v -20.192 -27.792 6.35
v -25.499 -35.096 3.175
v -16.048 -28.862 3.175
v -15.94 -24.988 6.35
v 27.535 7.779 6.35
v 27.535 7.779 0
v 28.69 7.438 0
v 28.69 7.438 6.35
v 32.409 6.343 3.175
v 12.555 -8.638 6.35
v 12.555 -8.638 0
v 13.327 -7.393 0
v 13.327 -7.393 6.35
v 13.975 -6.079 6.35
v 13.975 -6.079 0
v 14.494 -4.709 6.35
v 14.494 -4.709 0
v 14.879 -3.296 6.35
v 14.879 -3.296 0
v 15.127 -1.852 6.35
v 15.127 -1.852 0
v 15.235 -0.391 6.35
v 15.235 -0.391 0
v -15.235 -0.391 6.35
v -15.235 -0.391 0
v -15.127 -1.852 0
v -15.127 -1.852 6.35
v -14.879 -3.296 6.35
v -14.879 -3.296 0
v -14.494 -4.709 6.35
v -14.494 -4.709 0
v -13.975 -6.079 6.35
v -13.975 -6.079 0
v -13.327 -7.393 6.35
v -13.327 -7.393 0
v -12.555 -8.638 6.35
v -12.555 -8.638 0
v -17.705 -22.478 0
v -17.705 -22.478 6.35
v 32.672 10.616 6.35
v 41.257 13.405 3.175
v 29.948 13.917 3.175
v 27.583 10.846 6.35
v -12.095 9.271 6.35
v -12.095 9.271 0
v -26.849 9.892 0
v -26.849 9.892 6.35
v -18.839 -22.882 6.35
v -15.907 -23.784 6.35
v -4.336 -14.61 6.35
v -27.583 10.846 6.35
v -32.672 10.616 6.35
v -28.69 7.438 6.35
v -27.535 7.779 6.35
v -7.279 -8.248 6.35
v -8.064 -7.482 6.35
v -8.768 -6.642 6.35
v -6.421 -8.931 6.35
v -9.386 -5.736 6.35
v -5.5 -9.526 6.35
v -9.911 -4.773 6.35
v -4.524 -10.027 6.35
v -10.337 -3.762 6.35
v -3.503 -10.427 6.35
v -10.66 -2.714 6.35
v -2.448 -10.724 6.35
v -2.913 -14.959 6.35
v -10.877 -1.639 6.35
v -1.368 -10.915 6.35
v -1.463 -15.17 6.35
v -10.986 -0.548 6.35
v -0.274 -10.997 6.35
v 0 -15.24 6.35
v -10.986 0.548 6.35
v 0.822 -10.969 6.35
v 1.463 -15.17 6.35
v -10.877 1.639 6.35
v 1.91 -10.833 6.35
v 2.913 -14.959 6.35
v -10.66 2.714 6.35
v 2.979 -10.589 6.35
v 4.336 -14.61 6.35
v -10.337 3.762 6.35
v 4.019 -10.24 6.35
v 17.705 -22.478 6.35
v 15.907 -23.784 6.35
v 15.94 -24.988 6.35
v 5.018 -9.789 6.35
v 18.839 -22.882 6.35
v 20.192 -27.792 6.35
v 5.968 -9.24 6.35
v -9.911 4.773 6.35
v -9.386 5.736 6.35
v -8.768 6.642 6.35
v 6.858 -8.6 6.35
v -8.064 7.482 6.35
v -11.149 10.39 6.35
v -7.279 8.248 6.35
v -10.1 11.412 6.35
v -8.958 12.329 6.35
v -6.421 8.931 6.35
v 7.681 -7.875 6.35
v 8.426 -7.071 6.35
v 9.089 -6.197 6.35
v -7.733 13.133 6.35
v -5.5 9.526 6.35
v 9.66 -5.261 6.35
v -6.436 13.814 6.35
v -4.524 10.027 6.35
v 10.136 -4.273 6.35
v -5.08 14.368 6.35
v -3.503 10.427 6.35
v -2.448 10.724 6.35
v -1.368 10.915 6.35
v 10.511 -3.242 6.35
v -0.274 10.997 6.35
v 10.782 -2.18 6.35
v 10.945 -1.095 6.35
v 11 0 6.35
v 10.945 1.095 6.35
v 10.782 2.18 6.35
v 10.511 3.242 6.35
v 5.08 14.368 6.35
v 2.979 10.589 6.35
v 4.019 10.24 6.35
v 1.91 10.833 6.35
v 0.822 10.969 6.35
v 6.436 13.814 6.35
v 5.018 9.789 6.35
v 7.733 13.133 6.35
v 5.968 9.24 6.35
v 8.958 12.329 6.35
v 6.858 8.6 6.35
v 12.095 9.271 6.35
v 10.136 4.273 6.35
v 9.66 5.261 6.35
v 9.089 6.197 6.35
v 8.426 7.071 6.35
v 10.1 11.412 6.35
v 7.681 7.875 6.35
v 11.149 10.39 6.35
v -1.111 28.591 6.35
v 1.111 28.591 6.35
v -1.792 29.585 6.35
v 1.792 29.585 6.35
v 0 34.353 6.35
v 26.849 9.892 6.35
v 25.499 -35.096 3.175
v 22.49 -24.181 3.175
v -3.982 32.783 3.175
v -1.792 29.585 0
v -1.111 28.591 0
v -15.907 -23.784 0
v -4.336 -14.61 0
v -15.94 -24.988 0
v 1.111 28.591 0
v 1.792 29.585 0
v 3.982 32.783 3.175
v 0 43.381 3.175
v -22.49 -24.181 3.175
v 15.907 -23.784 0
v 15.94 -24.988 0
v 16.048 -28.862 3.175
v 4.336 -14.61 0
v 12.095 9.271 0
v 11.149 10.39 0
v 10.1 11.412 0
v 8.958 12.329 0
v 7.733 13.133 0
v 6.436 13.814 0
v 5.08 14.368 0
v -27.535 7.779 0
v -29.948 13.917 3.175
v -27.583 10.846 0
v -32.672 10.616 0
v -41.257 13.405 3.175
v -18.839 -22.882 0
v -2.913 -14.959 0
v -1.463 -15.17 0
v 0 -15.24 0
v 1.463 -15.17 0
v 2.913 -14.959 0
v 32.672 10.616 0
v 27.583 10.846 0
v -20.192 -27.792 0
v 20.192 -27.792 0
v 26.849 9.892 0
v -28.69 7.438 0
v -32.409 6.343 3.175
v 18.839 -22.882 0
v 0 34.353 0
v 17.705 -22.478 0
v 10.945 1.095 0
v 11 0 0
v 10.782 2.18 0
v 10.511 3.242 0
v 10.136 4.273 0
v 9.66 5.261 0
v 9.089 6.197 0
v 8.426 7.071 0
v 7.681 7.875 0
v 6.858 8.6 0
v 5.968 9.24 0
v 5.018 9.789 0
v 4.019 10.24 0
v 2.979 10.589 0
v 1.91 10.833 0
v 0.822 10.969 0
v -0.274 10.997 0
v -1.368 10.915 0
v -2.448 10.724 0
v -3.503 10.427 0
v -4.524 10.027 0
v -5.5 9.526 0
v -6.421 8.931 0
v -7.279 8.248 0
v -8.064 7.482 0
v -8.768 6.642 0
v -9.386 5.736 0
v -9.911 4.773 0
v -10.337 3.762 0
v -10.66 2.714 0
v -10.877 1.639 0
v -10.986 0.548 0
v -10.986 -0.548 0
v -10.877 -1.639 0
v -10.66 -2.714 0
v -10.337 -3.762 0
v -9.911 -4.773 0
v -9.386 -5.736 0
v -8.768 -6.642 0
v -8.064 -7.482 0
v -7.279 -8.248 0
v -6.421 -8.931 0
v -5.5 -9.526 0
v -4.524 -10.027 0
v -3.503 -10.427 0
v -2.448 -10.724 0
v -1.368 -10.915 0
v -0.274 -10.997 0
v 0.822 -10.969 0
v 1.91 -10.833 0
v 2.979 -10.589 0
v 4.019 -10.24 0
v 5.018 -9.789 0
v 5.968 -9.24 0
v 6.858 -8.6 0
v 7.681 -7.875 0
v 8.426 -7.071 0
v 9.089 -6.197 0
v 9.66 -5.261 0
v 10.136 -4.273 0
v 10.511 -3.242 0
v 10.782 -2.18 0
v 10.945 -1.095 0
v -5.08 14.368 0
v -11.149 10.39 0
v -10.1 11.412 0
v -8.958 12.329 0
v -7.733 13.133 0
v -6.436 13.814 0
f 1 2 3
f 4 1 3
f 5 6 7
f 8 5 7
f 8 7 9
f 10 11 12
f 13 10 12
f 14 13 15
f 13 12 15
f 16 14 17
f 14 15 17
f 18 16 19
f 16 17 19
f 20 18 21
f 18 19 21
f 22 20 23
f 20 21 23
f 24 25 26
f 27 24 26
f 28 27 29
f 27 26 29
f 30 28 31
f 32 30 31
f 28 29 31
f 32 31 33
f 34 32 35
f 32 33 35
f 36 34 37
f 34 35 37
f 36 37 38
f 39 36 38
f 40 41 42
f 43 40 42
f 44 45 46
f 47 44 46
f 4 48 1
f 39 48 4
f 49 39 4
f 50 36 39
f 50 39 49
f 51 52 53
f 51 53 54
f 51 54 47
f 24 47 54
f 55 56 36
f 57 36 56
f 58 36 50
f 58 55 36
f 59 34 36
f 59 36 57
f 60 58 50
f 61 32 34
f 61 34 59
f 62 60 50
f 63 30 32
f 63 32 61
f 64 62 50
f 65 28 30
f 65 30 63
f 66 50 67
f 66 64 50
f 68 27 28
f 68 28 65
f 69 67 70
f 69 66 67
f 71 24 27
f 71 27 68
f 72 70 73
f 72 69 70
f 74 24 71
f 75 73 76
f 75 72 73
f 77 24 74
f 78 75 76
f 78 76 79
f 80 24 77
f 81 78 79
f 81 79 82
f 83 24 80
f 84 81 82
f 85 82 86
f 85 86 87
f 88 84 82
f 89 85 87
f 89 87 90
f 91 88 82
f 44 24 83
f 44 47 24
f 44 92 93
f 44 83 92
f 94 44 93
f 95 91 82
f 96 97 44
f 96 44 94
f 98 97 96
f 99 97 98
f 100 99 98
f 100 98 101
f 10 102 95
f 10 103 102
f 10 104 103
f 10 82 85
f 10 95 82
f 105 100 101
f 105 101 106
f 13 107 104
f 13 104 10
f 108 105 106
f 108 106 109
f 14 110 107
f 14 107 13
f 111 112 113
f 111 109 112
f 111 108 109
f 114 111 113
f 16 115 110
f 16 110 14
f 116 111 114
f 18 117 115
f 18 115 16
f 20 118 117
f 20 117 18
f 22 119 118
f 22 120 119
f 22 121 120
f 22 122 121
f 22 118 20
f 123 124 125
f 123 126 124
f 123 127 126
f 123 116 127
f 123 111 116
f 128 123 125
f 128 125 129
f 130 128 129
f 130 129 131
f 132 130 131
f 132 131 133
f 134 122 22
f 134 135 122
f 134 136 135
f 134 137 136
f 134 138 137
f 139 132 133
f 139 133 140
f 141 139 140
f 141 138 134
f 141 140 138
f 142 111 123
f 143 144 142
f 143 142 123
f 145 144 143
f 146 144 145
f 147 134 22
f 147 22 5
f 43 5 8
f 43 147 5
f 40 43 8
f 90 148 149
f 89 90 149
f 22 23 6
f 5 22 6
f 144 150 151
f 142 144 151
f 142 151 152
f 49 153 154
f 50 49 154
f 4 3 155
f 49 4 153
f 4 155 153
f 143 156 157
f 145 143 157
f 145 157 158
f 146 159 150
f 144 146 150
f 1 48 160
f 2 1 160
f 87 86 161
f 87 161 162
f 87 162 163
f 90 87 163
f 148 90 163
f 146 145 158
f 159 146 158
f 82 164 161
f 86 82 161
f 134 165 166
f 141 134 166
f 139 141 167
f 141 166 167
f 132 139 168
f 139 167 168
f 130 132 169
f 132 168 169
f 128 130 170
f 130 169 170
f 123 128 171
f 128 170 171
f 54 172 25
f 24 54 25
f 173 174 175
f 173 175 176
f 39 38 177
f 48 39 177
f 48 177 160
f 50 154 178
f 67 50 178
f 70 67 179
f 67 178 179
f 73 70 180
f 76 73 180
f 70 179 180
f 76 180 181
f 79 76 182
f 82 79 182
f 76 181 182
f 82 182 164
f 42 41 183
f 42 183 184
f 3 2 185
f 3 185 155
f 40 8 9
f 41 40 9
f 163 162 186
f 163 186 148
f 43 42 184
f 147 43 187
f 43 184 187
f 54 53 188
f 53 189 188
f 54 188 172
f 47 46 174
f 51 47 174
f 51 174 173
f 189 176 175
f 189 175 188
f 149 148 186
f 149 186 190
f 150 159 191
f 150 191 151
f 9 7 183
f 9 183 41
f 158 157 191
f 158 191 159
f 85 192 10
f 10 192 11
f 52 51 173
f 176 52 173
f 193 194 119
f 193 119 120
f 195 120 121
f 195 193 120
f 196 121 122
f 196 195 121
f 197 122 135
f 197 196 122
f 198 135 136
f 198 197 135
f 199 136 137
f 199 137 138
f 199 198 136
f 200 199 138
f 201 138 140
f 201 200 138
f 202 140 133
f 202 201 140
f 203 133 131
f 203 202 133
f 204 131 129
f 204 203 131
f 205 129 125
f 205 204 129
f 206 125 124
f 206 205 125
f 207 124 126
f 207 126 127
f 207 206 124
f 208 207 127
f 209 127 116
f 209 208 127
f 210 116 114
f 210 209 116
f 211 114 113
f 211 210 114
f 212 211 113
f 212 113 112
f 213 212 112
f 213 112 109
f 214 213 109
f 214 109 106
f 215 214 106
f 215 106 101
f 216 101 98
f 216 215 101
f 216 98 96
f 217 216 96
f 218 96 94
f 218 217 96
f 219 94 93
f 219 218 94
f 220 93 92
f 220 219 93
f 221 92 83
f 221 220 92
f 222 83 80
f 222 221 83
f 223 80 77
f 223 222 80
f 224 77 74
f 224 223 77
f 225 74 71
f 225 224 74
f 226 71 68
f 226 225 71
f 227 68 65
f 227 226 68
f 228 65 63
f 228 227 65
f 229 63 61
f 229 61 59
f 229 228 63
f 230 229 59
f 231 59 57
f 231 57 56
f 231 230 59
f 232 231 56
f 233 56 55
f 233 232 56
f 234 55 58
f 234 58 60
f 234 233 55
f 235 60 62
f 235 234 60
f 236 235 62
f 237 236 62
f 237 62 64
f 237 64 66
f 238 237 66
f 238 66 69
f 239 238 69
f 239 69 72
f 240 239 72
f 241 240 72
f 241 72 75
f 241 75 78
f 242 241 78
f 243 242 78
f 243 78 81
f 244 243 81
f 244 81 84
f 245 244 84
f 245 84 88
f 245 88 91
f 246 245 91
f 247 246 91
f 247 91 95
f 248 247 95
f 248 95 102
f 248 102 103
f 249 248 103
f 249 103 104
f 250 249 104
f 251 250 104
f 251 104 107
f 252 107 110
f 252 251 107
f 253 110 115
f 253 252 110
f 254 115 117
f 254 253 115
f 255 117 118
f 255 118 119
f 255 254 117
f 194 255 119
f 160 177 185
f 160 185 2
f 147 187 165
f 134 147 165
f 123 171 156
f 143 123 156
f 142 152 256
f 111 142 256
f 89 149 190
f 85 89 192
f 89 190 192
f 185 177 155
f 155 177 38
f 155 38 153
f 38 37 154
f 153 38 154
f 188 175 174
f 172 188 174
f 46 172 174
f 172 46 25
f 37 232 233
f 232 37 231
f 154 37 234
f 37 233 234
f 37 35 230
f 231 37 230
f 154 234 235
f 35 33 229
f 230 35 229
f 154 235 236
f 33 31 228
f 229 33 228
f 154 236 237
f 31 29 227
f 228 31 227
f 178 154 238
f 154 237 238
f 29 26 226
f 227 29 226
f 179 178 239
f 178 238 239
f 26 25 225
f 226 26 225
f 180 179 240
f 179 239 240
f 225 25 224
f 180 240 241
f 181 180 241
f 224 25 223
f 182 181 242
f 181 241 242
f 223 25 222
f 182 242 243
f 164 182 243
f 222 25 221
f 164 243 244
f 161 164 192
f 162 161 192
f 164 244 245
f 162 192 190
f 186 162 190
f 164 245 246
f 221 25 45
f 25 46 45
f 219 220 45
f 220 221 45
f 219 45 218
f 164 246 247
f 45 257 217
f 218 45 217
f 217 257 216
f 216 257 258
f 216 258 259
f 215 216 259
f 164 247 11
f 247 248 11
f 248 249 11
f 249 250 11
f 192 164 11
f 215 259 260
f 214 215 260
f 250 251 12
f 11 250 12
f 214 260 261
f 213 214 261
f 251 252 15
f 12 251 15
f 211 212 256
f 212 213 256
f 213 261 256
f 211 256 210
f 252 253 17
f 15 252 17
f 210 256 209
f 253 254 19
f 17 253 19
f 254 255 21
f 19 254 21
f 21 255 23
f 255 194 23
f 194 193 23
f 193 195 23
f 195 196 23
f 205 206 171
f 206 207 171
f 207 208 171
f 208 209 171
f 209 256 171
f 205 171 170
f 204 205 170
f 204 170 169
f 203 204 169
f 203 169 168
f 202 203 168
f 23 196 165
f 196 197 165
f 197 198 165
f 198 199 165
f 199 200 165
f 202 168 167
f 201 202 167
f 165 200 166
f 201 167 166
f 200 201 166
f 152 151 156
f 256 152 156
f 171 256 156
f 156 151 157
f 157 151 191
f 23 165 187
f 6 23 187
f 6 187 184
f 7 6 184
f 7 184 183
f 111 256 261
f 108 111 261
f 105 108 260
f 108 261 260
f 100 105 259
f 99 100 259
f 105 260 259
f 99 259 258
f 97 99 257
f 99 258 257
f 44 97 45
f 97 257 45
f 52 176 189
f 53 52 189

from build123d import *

# Parameters (mm, degrees)
F0_R     = 11.0000034
F1_DEPTH = 6.35
F2_SIZE  = 3.17499


# Not quite as in the source:
# - a fillet or chamfer is up to 0.001 mm smaller than in the source, because OpenCascade refuses the exact size


with BuildPart() as f1:
    # F0 (on Top) → F1 (new body)
    with BuildSketch(Plane.XY):
        with BuildLine():
            Line((-1.1111190304, 28.591448421), (-5.08, 14.3684097937))
            ThreePointArc((-5.08, 14.3684097937), (-8.9578472449, 12.3294189943), (-12.0953634317, 9.2714499112))
            Line((-12.0953634317, 9.2714499112), (-26.8487286679, 9.8919804501))
            Line((-26.8487286679, 9.8919804501), (-29.9476720311, 13.9172692636))
            Line((-29.9476720311, 13.9172692636), (-41.2574764774, 13.4053667244))
            Line((-41.2574764774, 13.4053667244), (-32.4085412404, 6.3434926108))
            Line((-32.4085412404, 6.3434926108), (-27.5354379943, 7.7785064617))
            Line((-27.5354379943, 7.7785064617), (-15.2349760945, -0.3912842944))
            ThreePointArc((-15.2349760945, -0.3912842944), (-14.4941013083, -4.7094189943), (-12.5553457071, -8.6383386236))
            Line((-12.5553457071, -8.6383386236), (-17.7045459019, -22.4778682868))
            Line((-17.7045459019, -22.4778682868), (-22.4904492218, -24.1812559153))
            Line((-22.4904492218, -24.1812559153), (-25.4985227531, -35.0957057161))
            Line((-25.4985227531, -35.0957057161), (-16.0478099898, -28.8621073099))
            Line((-16.0478099898, -28.8621073099), (-15.9067175452, -23.784067046))
            Line((-15.9067175452, -23.784067046), (-4.3357330442, -14.6102367869))
            ThreePointArc((-4.3357330442, -14.6102367869), (0, -15.24), (4.3357330442, -14.6102367869))
            Line((4.3357330442, -14.6102367869), (15.9067175452, -23.784067046))
            Line((15.9067175452, -23.784067046), (16.0478099898, -28.8621073099))
            Line((16.0478099898, -28.8621073099), (25.4985227531, -35.0957057161))
            Line((25.4985227531, -35.0957057161), (22.4904492218, -24.1812559153))
            Line((22.4904492218, -24.1812559153), (17.7045459019, -22.4778682868))
            Line((17.7045459019, -22.4778682868), (12.5553457071, -8.6383386236))
            ThreePointArc((12.5553457071, -8.6383386236), (14.4941013083, -4.7094189943), (15.2349760945, -0.3912842944))
            Line((15.2349760945, -0.3912842944), (27.5354379943, 7.7785064617))
            Line((27.5354379943, 7.7785064617), (32.4085412404, 6.3434926108))
            Line((32.4085412404, 6.3434926108), (41.2574764774, 13.4053667244))
            Line((41.2574764774, 13.4053667244), (29.9476720311, 13.9172692636))
            Line((29.9476720311, 13.9172692636), (26.8487286679, 9.8919804501))
            Line((26.8487286679, 9.8919804501), (12.0953634317, 9.2714499112))
            ThreePointArc((12.0953634317, 9.2714499112), (8.9578472449, 12.3294189943), (5.08, 14.3684097937))
            Line((5.08, 14.3684097937), (1.1111190304, 28.591448421))
            Line((1.1111190304, 28.591448421), (3.9817700226, 32.7826013508))
            Line((3.9817700226, 32.7826013508), (0, 43.3806779834))
            Line((0, 43.3806779834), (-3.9817700226, 32.7826013508))
            Line((-3.9817700226, 32.7826013508), (-1.1111190304, 28.591448421))
        make_face()
        Circle(F0_R, mode=Mode.SUBTRACT)
    extrude(amount=F1_DEPTH)

    # F2 (size 3.175 in the source; OpenCascade refuses exactly that, so slightly less here)
    f2_edges = [f1.edges().sort_by_distance(p)[0] for p in [
        (35.602574, 13.661318, 6.35),
        (35.602574, 13.661318, 0),
        (36.833009, 9.87443, 6.35),
        (36.833009, 9.87443, 0),
        (1.990885, 38.08164, 6.35),
        (1.990885, 38.08164, 0),
        (23.994486, -29.638481, 6.35),
        (23.994486, -29.638481, 0),
        (-35.602574, 13.661318, 6.35),
        (-35.602574, 13.661318, 0),
        (-1.990885, 38.08164, 6.35),
        (-1.990885, 38.08164, 0),
        (-23.994486, -29.638481, 6.35),
        (-23.994486, -29.638481, 0),
        (-36.833009, 9.87443, 6.35),
        (-36.833009, 9.87443, 0),
        (-20.773166, -31.978907, 6.35),
        (-20.773166, -31.978907, 0),
        (20.773166, -31.978907, 6.35),
        (20.773166, -31.978907, 0),
    ]]
    chamfer(f2_edges, length=F2_SIZE)


solid = f1.part
